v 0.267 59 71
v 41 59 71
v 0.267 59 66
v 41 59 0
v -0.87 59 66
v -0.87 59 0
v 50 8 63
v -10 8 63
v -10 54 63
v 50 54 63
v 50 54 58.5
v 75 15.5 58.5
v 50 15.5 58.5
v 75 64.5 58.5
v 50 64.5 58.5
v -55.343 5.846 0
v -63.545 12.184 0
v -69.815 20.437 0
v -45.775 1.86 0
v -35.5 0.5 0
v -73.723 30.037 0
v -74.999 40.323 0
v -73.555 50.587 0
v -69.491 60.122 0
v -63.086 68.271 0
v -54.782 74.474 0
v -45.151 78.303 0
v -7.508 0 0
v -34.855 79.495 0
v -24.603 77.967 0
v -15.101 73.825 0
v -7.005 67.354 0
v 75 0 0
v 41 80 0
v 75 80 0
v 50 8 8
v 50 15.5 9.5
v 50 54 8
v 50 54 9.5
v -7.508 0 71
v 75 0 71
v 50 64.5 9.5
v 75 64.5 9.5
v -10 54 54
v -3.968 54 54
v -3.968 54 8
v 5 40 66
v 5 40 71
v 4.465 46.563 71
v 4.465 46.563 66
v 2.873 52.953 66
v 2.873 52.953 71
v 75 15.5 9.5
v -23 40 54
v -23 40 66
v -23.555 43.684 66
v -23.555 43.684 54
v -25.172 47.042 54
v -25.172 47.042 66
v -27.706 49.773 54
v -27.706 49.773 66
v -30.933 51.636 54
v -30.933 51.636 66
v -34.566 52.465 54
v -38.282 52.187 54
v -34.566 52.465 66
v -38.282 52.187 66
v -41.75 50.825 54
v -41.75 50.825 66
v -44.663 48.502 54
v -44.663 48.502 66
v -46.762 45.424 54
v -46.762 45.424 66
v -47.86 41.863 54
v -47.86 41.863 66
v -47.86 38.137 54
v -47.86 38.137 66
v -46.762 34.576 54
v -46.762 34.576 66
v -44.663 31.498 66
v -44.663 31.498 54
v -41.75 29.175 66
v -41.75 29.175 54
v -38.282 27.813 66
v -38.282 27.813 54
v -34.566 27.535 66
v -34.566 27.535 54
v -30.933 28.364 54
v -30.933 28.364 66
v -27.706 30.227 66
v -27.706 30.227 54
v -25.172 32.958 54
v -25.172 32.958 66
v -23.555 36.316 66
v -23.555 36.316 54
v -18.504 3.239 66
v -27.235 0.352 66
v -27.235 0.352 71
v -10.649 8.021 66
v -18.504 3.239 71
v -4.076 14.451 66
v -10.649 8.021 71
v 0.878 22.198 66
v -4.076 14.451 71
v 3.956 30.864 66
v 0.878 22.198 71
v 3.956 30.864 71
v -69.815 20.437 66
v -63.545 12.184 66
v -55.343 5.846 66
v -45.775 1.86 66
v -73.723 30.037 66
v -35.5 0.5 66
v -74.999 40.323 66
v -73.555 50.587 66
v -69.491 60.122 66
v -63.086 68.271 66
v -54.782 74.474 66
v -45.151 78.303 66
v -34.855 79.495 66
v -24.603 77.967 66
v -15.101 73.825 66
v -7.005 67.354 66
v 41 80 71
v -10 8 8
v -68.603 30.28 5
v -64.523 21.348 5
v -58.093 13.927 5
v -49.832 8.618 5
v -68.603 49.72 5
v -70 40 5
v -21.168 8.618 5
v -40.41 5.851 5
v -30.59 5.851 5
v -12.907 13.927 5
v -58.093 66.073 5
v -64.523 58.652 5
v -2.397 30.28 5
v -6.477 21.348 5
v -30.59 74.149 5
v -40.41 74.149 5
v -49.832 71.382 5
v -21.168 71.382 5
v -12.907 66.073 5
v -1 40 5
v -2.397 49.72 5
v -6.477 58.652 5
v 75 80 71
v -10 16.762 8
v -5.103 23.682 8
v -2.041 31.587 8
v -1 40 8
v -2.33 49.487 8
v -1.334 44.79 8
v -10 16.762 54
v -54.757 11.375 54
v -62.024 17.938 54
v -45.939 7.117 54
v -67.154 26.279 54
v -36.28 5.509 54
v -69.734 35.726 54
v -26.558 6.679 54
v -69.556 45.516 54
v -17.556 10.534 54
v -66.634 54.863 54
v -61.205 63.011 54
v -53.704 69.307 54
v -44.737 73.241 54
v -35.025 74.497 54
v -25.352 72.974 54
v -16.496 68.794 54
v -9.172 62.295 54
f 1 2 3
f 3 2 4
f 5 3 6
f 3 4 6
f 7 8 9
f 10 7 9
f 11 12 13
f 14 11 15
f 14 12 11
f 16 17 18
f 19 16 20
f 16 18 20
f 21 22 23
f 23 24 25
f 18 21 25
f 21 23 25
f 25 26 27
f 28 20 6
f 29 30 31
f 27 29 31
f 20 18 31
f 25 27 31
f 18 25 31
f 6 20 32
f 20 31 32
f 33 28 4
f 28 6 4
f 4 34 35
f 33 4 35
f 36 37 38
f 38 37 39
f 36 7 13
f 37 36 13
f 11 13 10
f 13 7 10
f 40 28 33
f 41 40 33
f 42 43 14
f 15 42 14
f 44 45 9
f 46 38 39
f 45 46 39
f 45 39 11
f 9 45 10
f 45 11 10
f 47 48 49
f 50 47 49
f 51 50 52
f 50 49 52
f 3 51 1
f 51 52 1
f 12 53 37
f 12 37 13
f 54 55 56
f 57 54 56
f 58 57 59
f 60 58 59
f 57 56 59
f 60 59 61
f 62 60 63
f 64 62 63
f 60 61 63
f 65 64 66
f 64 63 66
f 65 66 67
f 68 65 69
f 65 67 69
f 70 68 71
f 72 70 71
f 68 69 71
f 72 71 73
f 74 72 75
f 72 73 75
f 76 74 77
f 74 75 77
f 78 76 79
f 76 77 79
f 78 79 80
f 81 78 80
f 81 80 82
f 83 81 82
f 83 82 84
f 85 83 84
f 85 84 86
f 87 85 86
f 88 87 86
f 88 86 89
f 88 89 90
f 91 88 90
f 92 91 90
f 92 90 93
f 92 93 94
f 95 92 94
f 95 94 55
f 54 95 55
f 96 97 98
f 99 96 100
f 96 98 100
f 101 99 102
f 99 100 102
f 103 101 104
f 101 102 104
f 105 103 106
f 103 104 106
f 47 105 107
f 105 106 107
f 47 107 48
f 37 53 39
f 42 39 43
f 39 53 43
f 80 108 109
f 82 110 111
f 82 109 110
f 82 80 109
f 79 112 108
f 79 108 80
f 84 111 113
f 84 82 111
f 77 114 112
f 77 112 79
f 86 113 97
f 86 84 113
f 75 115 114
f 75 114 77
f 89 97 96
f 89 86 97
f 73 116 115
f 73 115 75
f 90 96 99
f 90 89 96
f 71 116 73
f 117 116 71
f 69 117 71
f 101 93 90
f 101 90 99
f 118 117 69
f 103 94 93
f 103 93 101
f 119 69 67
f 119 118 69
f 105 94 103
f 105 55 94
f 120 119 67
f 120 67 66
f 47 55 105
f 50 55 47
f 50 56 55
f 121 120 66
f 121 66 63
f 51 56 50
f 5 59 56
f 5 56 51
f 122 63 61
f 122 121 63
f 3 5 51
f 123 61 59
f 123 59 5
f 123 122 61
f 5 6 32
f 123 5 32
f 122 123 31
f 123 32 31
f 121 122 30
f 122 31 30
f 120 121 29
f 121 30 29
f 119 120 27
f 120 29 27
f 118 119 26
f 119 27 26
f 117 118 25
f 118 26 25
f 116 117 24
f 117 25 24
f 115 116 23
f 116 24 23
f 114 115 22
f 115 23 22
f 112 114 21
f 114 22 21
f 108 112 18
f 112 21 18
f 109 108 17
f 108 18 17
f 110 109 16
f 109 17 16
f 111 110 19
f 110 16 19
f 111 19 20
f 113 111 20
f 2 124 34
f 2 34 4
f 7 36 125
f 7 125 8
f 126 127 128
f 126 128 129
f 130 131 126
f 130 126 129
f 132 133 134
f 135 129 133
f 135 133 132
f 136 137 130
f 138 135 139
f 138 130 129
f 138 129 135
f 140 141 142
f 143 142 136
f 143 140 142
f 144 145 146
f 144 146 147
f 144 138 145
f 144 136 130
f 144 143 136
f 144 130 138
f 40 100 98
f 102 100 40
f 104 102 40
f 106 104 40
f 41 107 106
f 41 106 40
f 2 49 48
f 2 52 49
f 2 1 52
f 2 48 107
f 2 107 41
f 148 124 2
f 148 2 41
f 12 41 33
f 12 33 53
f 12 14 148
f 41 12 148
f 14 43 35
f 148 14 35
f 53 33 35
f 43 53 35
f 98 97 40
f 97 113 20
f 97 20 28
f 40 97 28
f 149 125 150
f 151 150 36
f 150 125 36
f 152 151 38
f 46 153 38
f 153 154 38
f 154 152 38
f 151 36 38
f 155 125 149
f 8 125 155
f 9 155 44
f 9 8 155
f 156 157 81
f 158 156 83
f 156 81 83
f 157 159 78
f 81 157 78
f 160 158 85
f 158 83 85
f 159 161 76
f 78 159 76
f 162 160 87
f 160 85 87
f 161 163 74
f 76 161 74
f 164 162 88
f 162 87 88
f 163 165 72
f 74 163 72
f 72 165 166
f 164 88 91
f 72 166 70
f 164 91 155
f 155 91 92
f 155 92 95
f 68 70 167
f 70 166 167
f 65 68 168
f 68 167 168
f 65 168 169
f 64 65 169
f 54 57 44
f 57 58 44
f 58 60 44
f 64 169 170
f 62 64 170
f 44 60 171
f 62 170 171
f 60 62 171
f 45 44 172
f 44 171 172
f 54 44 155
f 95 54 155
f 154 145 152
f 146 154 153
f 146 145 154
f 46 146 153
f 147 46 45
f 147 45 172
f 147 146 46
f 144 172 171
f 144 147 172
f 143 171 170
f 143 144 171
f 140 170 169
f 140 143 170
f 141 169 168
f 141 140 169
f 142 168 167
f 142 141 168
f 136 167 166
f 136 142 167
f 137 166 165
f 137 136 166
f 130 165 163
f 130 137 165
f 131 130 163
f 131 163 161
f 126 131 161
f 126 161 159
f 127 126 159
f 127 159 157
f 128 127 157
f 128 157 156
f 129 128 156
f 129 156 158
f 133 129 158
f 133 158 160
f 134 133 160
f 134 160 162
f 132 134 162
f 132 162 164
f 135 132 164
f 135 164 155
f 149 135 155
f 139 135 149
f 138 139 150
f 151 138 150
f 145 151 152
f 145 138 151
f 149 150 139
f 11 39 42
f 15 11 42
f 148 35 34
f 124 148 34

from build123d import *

# Parameters (mm, degrees)
F1_DEPTH  = 71
F2_W      = 49
F2_H      = 49
F3_DEPTH  = 25
F5_W      = 46
F5_H      = 55
F6_DEPTH  = 60
F8_R      = 34.5
F9_DEPTH  = 49
F10_R     = 12.5
F11_DEPTH = 25
F12_R     = 12.5
F13_DEPTH = 5


with BuildPart() as f1:
    # F0 (on Top) → F1 (new body)
    with BuildSketch(Plane.XY):
        with BuildLine():
            ThreePointArc((-35.5, 0.5), (-7.569282, 12.069282), (4, 40))
            ThreePointArc((4, 40), (2.763184, 49.807077), (-0.869811, 59))
            ThreePointArc((-0.869811, 59), (-69.490808, 60.121506), (-35.5, 0.5))
        make_face()
        with BuildLine():
            ThreePointArc((-0.869811, 59), (2.763184, 49.807077), (4, 40))
            ThreePointArc((4, 40), (-7.569282, 12.069282), (-35.5, 0.5))
            Line((-35.5, 0.5), (-7.508424, 0))
            Line((-7.508424, 0), (75, 0))
            Line((75, 0), (75, 80))
            Line((75, 80), (41, 80))
            Line((41, 80), (41, 59))
            Line((41, 59), (-0.869811, 59))
        make_face()
    extrude(amount=F1_DEPTH)

    # F2 (on face) → F3 (cut)
    with BuildSketch(Plane.YZ.offset(75)):
        with Locations((40, 34)):
            Rectangle(F2_W, F2_H)
    extrude(amount=-F3_DEPTH, mode=Mode.SUBTRACT)

    # F5 (on offset) → F6 (cut)
    with BuildSketch(Plane.YZ.offset(50)):
        with Locations((31, 35.5)):
            Rectangle(F5_W, F5_H)
    extrude(amount=-F6_DEPTH, mode=Mode.SUBTRACT)

    # F8 (on offset) → F9 (cut)
    with BuildSketch(Plane.XY.offset(5)):
        with Locations((-35.5, 40)):
            Circle(F8_R)
    extrude(amount=F9_DEPTH, mode=Mode.SUBTRACT)

    # F10 (on face) → F11 (cut)
    with BuildSketch(Plane.XY.offset(71)):
        with Locations((-35.5, 40)):
            Circle(F10_R)
    extrude(amount=-F11_DEPTH, mode=Mode.SUBTRACT)

    # F12 (on face) → F13 (cut)
    with BuildSketch(Plane.XY.offset(71)):
        with BuildLine():
            ThreePointArc((-27.234726, 0.352361), (-4.075538, 14.450965), (5, 40))
            ThreePointArc((5, 40), (3.798839, 49.790366), (0.266605, 59))
            Line((0.266605, 59), (-0.869811, 59))
            ThreePointArc((-0.869811, 59), (-69.490808, 60.121506), (-35.5, 0.5))
            Line((-35.5, 0.5), (-27.234726, 0.352361))
        make_face()
        with Locations((-35.5, 40)):
            Circle(F12_R, mode=Mode.SUBTRACT)
        with BuildLine():
            Line((-0.869811, 59), (0.266605, 59))
            ThreePointArc((0.266605, 59), (-72.168624, 57.194826), (-27.234726, 0.352361))
            Line((-27.234726, 0.352361), (-35.5, 0.5))
            ThreePointArc((-35.5, 0.5), (-69.490808, 60.121506), (-0.869811, 59))
        make_face()
    extrude(amount=-F13_DEPTH, mode=Mode.SUBTRACT)


solid = f1.part
